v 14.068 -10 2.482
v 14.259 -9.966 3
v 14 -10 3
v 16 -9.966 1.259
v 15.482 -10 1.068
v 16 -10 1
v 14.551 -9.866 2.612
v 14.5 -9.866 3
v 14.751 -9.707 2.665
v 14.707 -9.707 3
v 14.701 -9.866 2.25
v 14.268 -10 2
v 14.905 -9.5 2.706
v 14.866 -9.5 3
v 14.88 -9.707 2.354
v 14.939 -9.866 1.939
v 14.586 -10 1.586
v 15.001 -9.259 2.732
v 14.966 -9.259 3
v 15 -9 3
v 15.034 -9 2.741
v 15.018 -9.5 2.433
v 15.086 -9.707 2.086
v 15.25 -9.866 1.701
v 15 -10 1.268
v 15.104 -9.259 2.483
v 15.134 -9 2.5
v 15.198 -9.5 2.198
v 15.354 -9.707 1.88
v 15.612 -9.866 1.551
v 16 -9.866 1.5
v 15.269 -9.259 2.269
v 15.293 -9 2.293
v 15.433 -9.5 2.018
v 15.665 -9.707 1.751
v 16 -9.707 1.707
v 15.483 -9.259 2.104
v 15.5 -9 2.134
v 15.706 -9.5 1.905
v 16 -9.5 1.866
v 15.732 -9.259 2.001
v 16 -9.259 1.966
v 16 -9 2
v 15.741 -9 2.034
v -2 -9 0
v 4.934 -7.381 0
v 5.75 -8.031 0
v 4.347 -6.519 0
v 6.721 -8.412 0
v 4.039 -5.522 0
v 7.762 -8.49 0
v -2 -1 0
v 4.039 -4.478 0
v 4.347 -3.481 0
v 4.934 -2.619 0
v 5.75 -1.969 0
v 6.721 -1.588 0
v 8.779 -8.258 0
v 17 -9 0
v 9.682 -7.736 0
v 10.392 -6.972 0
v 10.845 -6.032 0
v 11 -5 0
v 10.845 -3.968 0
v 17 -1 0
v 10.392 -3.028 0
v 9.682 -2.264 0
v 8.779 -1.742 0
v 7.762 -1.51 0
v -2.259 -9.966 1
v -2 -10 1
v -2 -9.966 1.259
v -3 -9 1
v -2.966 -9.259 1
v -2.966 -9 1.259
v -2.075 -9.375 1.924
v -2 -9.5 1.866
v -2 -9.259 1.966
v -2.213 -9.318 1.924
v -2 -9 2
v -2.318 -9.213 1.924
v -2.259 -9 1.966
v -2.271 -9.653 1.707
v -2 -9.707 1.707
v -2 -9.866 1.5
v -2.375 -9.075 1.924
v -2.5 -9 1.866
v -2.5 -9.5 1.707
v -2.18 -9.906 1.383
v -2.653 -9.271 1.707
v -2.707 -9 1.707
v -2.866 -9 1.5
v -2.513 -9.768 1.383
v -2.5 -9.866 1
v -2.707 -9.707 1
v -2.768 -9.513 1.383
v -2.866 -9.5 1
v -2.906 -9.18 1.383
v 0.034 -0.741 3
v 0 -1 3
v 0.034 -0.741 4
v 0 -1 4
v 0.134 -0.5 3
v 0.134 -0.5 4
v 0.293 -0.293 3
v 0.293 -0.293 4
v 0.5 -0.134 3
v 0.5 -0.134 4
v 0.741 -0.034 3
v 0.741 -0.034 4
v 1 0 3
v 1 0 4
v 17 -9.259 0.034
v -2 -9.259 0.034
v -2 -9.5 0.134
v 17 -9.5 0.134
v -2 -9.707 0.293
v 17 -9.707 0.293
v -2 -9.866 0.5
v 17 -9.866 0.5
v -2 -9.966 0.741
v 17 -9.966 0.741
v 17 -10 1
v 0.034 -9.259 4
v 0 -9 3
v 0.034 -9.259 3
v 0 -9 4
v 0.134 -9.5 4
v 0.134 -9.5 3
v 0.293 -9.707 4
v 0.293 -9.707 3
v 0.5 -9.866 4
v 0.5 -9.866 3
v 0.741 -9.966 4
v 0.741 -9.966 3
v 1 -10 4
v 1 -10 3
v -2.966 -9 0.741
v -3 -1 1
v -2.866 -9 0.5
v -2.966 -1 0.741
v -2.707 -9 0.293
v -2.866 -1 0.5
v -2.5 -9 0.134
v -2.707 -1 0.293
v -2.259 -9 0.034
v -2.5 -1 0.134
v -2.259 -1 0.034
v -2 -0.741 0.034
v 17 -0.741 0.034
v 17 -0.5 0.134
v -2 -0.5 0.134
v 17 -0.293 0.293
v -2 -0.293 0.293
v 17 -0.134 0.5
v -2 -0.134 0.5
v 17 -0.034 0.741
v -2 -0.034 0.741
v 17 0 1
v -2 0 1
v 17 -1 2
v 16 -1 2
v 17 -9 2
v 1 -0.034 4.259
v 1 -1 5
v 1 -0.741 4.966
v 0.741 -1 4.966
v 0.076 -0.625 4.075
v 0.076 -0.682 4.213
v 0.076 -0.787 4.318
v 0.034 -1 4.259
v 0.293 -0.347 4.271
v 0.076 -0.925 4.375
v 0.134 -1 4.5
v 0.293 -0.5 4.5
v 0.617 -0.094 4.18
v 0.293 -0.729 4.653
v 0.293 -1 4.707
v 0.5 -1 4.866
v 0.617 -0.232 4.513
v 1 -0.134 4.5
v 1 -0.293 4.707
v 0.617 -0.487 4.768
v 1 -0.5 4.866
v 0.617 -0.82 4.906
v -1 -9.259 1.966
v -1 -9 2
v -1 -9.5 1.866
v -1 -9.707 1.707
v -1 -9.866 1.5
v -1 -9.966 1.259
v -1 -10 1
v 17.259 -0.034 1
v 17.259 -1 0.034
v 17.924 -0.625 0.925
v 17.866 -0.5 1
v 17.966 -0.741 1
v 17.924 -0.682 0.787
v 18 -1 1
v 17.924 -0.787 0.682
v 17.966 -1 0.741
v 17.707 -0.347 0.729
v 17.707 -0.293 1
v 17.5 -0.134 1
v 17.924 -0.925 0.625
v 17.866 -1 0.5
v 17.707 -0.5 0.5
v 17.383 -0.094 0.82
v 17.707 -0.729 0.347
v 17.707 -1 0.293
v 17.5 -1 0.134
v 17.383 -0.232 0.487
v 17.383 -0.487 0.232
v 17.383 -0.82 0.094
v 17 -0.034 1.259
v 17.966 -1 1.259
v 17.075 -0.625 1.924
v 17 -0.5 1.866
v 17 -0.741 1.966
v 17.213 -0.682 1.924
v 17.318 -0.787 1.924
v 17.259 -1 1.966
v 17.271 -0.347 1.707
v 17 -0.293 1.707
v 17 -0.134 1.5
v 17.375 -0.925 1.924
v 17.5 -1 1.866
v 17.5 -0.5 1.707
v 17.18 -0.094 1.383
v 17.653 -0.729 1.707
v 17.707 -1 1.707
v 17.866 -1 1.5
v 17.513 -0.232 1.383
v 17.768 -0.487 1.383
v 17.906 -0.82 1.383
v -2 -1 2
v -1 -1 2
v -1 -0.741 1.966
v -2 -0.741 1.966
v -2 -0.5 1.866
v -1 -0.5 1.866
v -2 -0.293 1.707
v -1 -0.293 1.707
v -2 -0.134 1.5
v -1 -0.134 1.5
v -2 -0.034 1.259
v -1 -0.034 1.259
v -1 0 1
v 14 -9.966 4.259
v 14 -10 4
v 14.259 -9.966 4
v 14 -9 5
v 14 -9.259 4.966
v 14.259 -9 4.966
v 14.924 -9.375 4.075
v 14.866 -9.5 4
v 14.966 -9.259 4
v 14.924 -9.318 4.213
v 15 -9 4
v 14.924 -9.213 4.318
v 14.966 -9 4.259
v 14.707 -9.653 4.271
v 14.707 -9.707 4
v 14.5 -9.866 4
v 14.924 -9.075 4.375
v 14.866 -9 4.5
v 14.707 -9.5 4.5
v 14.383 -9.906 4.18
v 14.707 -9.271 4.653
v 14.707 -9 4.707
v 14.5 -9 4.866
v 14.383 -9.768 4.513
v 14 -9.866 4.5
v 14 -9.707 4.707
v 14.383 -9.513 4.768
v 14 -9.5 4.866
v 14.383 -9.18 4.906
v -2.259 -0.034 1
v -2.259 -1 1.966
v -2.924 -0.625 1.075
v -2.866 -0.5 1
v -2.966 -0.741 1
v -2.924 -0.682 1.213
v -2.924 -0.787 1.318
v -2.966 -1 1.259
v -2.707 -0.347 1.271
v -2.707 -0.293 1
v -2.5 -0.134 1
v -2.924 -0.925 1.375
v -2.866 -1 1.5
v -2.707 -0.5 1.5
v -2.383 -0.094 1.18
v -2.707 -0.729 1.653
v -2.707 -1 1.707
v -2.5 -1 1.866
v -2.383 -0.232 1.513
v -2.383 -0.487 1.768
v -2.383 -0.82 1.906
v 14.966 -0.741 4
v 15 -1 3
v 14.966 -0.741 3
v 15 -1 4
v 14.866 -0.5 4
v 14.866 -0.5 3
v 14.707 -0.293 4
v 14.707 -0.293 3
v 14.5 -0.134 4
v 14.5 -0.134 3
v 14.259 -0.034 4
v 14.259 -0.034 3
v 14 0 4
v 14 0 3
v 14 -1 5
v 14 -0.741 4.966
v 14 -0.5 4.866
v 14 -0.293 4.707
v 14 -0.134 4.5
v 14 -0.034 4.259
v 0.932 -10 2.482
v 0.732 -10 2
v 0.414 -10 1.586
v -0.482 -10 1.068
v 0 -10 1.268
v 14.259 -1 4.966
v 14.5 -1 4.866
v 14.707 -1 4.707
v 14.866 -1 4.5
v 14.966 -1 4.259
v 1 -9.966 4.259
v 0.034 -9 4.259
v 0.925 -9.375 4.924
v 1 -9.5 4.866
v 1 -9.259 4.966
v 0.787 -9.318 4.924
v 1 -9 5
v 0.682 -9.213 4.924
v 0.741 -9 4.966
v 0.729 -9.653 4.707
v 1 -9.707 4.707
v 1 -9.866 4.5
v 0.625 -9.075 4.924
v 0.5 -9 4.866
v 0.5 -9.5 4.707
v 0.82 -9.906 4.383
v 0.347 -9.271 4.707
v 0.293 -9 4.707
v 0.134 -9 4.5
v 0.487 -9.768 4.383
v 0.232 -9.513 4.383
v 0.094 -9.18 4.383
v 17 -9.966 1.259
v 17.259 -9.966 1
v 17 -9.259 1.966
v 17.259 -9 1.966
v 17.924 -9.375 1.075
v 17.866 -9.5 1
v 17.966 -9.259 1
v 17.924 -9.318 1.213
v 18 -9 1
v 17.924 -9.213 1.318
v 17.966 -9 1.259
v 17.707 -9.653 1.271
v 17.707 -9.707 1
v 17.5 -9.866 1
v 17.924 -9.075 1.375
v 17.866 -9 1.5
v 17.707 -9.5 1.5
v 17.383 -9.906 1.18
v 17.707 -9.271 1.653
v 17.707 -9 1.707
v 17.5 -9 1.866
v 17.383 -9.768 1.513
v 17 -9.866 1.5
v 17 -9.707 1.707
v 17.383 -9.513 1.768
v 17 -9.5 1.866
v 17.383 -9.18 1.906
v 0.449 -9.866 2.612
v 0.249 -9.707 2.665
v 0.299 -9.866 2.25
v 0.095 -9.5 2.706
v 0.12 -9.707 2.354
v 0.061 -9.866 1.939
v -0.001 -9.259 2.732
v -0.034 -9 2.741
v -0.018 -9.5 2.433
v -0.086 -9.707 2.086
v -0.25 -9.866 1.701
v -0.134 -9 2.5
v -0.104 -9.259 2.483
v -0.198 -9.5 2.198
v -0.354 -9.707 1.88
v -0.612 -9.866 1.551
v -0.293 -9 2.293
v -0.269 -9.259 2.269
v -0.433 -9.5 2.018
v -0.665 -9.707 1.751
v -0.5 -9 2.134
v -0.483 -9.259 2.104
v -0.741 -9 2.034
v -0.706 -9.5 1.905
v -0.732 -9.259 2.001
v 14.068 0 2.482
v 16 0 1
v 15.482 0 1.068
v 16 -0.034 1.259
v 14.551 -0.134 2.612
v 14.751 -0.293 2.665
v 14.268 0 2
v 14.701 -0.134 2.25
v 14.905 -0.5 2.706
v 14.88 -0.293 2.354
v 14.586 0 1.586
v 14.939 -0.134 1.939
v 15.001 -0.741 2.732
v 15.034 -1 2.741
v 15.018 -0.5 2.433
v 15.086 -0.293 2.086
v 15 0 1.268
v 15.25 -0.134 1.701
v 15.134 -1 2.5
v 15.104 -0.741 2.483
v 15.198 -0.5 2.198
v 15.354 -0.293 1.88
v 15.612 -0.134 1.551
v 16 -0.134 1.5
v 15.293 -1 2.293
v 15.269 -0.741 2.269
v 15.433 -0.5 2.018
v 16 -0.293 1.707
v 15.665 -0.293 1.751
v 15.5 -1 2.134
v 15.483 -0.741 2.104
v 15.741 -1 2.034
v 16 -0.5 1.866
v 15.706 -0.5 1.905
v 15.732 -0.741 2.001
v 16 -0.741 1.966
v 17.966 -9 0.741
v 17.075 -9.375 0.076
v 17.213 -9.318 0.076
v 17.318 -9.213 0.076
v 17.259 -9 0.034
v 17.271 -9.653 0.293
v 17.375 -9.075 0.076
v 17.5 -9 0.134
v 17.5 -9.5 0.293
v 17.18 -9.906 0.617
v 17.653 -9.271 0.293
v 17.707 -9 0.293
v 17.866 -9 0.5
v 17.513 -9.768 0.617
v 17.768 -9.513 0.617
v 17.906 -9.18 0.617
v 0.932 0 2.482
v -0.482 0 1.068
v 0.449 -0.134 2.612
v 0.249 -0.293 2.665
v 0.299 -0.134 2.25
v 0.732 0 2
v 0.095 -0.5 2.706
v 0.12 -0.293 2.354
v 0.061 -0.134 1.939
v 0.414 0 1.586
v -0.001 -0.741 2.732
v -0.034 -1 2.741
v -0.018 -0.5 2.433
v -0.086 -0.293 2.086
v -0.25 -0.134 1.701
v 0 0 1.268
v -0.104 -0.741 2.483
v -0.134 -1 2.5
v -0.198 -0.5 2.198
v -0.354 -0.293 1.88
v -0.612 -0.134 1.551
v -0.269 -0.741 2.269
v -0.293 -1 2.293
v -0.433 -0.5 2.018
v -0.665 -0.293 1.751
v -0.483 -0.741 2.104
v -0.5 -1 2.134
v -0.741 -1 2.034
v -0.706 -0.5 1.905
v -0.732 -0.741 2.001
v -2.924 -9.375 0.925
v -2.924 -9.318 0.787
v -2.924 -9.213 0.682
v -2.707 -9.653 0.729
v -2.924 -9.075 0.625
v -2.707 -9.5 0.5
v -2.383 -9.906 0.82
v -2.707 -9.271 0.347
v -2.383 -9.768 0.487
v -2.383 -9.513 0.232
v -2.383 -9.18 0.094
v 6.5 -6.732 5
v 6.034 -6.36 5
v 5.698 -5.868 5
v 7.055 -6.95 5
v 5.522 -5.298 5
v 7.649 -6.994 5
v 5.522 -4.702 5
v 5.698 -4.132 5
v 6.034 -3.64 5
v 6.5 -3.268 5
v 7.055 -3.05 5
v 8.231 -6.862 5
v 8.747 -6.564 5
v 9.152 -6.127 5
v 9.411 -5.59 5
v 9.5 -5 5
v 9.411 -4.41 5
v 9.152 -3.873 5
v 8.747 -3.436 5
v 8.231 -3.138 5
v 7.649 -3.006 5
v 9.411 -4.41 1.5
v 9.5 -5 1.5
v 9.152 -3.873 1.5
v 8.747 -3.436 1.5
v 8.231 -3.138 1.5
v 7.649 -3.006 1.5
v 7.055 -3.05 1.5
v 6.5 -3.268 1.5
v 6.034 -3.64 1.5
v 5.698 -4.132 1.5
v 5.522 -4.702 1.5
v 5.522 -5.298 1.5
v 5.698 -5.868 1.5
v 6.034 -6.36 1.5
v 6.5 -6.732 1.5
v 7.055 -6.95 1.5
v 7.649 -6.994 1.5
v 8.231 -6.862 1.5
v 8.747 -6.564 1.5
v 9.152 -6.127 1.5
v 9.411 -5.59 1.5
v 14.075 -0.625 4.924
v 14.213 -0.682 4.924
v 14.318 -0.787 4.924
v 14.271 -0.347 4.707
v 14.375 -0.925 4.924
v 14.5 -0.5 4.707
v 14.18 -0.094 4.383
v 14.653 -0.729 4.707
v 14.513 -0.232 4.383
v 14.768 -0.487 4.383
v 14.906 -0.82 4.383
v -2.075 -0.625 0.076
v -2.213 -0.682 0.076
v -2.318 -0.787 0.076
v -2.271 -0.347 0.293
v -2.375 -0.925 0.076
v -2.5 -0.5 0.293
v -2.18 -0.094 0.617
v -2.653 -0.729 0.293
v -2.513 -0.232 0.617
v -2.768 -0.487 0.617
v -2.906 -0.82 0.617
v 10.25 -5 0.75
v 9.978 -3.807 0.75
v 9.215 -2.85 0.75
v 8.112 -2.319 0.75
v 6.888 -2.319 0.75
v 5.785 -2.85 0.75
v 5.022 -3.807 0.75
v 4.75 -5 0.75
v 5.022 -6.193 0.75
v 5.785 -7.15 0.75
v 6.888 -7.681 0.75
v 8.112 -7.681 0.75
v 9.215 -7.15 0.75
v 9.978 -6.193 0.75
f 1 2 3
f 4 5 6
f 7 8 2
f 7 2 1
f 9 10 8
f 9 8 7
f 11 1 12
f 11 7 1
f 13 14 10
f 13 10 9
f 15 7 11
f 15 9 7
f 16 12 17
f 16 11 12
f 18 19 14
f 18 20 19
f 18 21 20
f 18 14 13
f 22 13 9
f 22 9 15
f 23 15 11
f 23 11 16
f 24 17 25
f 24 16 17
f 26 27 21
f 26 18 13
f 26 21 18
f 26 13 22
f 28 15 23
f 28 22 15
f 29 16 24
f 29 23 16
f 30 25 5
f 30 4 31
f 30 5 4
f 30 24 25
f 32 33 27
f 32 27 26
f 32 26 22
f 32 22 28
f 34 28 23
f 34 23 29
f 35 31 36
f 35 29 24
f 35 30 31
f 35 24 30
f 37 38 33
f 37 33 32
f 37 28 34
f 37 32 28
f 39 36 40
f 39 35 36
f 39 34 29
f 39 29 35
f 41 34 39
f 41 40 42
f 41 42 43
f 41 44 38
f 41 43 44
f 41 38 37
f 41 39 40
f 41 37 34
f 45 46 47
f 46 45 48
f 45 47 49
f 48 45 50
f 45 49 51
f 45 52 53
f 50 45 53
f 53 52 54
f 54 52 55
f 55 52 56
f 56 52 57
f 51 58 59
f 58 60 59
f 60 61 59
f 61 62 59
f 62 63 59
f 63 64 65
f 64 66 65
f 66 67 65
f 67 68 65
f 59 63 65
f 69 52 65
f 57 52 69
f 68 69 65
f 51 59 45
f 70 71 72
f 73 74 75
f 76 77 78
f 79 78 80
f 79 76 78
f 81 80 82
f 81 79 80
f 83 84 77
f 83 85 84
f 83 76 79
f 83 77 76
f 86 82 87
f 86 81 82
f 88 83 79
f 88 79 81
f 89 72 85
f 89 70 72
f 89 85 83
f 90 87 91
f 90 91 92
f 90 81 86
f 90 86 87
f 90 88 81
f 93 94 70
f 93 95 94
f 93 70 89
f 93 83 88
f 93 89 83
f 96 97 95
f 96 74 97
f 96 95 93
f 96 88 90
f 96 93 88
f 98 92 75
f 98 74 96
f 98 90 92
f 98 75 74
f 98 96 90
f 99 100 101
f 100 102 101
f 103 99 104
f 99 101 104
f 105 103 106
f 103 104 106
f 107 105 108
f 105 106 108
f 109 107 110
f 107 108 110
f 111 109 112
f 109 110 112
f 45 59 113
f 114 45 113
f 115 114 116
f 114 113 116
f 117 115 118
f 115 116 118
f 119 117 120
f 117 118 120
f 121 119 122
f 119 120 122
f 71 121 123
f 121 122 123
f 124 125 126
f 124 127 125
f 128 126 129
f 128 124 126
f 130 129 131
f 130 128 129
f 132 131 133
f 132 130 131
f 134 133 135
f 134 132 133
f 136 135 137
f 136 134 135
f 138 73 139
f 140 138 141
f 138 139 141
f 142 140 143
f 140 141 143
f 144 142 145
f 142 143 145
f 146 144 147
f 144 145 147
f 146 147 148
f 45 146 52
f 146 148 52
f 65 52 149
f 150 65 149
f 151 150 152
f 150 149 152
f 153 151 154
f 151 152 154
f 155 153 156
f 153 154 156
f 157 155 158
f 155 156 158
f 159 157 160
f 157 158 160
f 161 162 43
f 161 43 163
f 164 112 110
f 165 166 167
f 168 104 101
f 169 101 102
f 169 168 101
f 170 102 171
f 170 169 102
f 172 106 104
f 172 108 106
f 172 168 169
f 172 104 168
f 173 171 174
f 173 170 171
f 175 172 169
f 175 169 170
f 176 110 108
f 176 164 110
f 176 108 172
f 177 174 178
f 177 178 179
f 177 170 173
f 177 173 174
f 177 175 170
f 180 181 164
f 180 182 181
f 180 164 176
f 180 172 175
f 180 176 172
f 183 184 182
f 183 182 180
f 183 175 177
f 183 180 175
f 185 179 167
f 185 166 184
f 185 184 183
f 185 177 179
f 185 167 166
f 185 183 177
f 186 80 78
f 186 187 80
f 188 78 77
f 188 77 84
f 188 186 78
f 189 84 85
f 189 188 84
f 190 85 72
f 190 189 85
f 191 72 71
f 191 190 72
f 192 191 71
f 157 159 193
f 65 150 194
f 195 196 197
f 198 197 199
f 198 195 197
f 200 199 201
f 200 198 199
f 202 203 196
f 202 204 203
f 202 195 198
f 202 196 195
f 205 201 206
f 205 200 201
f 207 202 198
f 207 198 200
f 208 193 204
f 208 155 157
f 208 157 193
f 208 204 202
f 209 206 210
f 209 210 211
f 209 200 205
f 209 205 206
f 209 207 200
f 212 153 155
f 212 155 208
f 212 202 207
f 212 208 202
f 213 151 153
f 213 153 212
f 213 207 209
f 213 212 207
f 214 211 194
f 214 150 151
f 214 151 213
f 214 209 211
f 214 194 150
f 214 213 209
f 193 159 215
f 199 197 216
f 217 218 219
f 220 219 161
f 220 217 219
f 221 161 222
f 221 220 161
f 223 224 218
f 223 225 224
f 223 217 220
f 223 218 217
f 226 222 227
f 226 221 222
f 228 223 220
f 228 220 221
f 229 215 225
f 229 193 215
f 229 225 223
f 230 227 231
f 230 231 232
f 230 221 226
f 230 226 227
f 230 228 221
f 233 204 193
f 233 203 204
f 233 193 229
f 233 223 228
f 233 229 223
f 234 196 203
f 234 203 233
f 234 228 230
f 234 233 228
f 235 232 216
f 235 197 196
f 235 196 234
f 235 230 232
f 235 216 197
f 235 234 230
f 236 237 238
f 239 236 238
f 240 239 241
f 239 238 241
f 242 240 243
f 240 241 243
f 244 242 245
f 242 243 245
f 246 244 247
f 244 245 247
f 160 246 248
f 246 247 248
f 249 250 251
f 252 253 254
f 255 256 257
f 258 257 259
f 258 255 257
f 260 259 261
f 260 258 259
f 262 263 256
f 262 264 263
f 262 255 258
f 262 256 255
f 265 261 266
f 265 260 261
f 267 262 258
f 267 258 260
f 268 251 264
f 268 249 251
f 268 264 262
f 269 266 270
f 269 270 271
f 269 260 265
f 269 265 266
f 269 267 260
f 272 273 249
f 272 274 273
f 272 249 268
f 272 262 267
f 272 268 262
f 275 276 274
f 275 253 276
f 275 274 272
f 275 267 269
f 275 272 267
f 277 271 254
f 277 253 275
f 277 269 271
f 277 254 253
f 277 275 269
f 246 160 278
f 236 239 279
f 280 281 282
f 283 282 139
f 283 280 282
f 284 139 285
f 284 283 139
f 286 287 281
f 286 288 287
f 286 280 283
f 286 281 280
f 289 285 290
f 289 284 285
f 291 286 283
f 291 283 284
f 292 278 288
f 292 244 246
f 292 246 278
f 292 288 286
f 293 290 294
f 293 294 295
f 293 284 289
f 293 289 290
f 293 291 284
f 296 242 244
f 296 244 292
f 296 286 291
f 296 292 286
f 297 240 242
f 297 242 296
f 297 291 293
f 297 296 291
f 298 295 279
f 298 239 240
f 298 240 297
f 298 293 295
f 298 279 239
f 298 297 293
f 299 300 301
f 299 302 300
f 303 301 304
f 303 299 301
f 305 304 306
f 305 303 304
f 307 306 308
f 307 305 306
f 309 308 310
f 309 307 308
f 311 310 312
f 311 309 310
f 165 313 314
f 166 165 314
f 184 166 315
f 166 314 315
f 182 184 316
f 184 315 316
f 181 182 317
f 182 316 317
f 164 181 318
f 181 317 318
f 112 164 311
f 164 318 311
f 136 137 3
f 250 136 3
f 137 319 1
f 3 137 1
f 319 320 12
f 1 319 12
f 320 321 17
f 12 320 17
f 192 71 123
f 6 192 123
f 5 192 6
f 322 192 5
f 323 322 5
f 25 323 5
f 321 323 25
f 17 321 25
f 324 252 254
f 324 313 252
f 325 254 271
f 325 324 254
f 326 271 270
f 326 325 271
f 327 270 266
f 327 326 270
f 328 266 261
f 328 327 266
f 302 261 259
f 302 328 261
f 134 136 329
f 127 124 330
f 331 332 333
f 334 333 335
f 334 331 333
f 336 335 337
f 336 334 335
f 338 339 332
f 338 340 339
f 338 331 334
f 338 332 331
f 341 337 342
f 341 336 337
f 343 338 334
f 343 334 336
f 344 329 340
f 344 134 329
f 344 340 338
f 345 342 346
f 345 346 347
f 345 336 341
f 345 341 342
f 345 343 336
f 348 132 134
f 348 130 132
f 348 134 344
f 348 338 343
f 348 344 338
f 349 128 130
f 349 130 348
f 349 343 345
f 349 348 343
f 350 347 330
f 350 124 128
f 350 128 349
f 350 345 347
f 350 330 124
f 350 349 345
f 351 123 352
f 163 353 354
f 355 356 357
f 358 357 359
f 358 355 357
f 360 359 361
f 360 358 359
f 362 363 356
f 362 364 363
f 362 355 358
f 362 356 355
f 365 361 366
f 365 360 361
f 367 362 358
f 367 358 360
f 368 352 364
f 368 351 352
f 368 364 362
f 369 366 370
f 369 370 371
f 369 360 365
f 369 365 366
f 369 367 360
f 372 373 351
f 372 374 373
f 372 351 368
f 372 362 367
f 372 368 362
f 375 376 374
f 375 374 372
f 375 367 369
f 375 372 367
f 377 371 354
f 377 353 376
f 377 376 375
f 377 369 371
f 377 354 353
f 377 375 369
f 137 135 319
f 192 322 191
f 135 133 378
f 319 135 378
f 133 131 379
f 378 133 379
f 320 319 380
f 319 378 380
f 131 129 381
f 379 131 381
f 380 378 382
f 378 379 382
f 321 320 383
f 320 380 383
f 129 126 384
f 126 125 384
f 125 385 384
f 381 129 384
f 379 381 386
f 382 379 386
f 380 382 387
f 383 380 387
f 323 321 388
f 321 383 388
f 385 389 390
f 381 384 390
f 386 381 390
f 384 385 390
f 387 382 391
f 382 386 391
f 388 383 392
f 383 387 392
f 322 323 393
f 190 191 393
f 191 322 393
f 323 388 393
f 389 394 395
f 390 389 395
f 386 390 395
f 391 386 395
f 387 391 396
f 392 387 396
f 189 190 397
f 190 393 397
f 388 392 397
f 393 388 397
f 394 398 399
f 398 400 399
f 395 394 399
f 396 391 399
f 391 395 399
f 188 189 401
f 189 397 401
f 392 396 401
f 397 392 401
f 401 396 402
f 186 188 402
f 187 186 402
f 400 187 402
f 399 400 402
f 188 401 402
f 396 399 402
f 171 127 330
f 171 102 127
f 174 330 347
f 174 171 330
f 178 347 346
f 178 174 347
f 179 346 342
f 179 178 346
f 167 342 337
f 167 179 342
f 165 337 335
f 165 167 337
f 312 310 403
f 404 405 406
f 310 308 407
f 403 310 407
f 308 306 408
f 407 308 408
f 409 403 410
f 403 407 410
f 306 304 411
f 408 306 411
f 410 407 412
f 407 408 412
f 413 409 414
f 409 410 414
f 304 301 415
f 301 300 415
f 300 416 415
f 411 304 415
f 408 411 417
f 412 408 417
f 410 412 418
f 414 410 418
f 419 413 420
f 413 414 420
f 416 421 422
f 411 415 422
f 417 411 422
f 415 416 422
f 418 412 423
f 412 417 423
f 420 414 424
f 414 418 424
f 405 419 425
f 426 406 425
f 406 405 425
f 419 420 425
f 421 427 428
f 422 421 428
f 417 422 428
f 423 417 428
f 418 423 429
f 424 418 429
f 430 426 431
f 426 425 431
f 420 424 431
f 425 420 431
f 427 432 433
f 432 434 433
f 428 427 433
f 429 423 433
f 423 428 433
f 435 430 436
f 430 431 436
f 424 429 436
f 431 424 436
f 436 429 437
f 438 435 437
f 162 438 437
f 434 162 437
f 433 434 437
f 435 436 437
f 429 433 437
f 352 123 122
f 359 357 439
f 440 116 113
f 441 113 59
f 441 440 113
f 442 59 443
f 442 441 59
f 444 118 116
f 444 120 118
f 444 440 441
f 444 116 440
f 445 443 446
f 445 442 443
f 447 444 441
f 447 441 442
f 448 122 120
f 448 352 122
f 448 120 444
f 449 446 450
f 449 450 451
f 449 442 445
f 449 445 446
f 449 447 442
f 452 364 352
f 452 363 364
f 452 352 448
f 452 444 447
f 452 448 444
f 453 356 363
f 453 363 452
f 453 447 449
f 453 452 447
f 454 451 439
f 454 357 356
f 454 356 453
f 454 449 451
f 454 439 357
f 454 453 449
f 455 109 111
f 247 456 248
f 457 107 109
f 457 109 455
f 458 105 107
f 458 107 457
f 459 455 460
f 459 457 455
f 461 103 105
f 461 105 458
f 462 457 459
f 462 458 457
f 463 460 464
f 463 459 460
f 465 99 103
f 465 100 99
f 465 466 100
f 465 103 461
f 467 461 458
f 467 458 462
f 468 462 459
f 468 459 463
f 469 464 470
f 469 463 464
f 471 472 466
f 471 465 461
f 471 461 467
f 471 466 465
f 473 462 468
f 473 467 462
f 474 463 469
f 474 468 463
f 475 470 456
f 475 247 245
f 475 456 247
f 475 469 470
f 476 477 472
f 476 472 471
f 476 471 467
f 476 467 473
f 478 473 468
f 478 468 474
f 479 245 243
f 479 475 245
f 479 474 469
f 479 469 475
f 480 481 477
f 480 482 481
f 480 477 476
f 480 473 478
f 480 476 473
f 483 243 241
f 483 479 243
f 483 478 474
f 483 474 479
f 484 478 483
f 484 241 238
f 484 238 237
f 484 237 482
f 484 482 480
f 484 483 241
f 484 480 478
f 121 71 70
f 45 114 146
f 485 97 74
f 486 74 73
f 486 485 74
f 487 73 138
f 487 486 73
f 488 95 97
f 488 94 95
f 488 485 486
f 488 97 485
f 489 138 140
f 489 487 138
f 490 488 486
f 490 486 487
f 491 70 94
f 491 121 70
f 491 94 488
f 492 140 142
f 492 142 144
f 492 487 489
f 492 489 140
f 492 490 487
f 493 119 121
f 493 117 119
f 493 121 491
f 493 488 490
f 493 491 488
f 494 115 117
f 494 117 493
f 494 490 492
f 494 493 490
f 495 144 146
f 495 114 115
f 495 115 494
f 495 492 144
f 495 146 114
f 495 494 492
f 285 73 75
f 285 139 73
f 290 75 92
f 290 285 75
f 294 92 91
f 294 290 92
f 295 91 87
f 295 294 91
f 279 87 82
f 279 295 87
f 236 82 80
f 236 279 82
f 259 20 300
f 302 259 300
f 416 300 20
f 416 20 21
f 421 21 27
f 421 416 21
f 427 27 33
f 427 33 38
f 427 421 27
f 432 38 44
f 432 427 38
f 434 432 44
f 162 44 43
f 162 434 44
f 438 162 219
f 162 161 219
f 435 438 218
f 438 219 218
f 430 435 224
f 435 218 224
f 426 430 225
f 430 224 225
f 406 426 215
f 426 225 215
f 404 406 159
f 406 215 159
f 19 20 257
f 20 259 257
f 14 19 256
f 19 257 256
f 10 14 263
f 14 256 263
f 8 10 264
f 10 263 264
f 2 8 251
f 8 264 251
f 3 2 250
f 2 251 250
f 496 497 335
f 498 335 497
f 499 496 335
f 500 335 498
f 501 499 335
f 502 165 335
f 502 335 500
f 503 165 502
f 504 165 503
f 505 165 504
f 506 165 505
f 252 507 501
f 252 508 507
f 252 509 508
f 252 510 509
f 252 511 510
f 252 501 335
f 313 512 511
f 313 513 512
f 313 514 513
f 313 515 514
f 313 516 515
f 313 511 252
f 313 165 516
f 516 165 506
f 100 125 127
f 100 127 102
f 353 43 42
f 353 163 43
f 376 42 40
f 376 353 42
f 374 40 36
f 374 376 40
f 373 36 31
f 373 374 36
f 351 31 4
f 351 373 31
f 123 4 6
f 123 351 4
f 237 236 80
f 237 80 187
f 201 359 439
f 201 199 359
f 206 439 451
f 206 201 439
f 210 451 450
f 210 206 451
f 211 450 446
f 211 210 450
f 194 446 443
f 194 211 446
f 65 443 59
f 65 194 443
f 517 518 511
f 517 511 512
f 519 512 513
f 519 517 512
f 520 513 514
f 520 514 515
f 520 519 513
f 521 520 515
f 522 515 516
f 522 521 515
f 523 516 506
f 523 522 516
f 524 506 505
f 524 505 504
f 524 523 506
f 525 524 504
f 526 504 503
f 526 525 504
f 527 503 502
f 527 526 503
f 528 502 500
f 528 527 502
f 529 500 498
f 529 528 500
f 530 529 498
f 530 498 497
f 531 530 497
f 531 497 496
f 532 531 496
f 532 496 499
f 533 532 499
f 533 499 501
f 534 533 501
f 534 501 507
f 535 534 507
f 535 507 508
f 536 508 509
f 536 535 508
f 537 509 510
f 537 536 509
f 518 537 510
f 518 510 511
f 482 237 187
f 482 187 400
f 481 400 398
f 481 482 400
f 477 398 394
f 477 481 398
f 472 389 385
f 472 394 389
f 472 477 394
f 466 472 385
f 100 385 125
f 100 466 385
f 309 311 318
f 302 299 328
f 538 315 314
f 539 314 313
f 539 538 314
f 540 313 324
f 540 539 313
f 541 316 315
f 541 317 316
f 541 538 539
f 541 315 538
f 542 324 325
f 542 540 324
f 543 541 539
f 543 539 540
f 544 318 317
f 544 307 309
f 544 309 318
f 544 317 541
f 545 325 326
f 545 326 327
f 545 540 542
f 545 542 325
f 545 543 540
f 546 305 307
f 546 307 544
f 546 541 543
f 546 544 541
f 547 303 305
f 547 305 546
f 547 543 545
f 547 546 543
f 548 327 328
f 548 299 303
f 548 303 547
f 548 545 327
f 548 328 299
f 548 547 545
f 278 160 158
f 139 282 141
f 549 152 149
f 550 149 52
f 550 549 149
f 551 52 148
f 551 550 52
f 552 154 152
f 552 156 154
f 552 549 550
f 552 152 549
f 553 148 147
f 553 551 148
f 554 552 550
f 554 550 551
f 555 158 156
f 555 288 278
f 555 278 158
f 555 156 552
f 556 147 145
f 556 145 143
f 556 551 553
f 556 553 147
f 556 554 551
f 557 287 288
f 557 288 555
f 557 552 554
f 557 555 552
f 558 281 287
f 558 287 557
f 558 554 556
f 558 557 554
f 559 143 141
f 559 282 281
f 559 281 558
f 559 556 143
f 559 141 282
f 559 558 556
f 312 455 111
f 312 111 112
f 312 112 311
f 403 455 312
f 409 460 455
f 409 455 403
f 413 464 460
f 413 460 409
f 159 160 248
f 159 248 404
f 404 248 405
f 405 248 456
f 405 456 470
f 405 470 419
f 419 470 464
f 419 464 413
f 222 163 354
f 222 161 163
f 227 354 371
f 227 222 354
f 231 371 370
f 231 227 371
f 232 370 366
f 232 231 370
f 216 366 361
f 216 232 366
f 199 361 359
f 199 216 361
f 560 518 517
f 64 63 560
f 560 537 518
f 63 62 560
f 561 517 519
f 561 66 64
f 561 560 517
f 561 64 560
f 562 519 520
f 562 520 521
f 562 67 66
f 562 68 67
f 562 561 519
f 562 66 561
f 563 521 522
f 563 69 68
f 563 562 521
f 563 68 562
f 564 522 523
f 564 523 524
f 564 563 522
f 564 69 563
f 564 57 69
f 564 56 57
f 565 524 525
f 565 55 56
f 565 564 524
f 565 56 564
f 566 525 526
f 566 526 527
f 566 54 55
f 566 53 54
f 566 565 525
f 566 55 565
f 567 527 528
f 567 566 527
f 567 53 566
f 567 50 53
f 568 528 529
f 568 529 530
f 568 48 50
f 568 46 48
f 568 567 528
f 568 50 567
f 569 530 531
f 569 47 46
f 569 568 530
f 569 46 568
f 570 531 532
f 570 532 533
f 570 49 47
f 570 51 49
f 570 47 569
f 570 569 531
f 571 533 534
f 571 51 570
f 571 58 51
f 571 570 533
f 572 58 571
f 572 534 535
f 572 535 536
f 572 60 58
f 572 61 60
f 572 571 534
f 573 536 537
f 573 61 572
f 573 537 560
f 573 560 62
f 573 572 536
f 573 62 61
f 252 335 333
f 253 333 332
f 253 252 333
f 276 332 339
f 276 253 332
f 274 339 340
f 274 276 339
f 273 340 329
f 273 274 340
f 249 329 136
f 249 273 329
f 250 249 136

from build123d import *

# Parameters (mm, degrees)
F0_W     = 15
F0_H     = 10
F0_R     = 3.5
F1_DEPTH = 5
F0_W_2   = 3
F2_DEPTH = 2
F3_R     = 0.99999
F0_R_2   = 2
F4_DEPTH = 5
F5_SIZE  = 1.5


# Not quite as in the source:
# - a fillet or chamfer is up to 0.001 mm smaller than in the source, because OpenCascade refuses the exact size


with BuildPart() as f1:
    # F0 (on Top) → F1 (new body)
    with BuildSketch(Plane.XY):
        with Locations((7.5, -5)):
            Rectangle(F0_W, F0_H)
        with Locations((7.5, -5)):
            Circle(F0_R, mode=Mode.SUBTRACT)
    extrude(amount=F1_DEPTH)

    # F0 (on Top) → F2 (join)
    with BuildSketch(Plane.XY):
        with Locations((-1.5, -5)):
            Rectangle(F0_W_2, F0_H)
        with Locations((16.5, -5)):
            Rectangle(F0_W_2, F0_H)
    extrude(amount=F2_DEPTH)

    # F3 (radius 1 in the source; OpenCascade refuses exactly that, so slightly less here)
    f3_edges = [f1.edges().sort_by_distance(p)[0] for p in [
        (15, 0, 3.5),
        (7.5, 0, 5),
        (0, 0, 3.5),
        (-1.5, 0, 2),
        (-3, 0, 1),
        (7.5, 0, 0),
        (18, 0, 1),
        (16.5, 0, 2),
        (0, -10, 3.5),
        (7.5, -10, 5),
        (15, -10, 3.5),
        (16.5, -10, 2),
        (18, -10, 1),
        (7.5, -10, 0),
        (-3, -10, 1),
        (-1.5, -10, 2),
        (15, -5, 2),
        (15, -5, 5),
        (18, -5, 0),
        (18, -5, 2),
        (0, -5, 2),
        (-3, -5, 2),
        (0, -5, 5),
        (-3, -5, 0),
    ]]
    fillet(f3_edges, radius=F3_R)

    # F0 (on Top) → F4 (join)
    with BuildSketch(Plane.XY):
        with Locations((7.5, -5)):
            Circle(F0_R)
        with Locations((7.5, -5)):
            Circle(F0_R_2, mode=Mode.SUBTRACT)
    extrude(amount=F4_DEPTH)

    # F5
    f5_edges = [f1.edges().sort_by_distance(p)[0] for p in [
        (5.5, -5, 0),
    ]]
    chamfer(f5_edges, length=F5_SIZE)


solid = f1.part
